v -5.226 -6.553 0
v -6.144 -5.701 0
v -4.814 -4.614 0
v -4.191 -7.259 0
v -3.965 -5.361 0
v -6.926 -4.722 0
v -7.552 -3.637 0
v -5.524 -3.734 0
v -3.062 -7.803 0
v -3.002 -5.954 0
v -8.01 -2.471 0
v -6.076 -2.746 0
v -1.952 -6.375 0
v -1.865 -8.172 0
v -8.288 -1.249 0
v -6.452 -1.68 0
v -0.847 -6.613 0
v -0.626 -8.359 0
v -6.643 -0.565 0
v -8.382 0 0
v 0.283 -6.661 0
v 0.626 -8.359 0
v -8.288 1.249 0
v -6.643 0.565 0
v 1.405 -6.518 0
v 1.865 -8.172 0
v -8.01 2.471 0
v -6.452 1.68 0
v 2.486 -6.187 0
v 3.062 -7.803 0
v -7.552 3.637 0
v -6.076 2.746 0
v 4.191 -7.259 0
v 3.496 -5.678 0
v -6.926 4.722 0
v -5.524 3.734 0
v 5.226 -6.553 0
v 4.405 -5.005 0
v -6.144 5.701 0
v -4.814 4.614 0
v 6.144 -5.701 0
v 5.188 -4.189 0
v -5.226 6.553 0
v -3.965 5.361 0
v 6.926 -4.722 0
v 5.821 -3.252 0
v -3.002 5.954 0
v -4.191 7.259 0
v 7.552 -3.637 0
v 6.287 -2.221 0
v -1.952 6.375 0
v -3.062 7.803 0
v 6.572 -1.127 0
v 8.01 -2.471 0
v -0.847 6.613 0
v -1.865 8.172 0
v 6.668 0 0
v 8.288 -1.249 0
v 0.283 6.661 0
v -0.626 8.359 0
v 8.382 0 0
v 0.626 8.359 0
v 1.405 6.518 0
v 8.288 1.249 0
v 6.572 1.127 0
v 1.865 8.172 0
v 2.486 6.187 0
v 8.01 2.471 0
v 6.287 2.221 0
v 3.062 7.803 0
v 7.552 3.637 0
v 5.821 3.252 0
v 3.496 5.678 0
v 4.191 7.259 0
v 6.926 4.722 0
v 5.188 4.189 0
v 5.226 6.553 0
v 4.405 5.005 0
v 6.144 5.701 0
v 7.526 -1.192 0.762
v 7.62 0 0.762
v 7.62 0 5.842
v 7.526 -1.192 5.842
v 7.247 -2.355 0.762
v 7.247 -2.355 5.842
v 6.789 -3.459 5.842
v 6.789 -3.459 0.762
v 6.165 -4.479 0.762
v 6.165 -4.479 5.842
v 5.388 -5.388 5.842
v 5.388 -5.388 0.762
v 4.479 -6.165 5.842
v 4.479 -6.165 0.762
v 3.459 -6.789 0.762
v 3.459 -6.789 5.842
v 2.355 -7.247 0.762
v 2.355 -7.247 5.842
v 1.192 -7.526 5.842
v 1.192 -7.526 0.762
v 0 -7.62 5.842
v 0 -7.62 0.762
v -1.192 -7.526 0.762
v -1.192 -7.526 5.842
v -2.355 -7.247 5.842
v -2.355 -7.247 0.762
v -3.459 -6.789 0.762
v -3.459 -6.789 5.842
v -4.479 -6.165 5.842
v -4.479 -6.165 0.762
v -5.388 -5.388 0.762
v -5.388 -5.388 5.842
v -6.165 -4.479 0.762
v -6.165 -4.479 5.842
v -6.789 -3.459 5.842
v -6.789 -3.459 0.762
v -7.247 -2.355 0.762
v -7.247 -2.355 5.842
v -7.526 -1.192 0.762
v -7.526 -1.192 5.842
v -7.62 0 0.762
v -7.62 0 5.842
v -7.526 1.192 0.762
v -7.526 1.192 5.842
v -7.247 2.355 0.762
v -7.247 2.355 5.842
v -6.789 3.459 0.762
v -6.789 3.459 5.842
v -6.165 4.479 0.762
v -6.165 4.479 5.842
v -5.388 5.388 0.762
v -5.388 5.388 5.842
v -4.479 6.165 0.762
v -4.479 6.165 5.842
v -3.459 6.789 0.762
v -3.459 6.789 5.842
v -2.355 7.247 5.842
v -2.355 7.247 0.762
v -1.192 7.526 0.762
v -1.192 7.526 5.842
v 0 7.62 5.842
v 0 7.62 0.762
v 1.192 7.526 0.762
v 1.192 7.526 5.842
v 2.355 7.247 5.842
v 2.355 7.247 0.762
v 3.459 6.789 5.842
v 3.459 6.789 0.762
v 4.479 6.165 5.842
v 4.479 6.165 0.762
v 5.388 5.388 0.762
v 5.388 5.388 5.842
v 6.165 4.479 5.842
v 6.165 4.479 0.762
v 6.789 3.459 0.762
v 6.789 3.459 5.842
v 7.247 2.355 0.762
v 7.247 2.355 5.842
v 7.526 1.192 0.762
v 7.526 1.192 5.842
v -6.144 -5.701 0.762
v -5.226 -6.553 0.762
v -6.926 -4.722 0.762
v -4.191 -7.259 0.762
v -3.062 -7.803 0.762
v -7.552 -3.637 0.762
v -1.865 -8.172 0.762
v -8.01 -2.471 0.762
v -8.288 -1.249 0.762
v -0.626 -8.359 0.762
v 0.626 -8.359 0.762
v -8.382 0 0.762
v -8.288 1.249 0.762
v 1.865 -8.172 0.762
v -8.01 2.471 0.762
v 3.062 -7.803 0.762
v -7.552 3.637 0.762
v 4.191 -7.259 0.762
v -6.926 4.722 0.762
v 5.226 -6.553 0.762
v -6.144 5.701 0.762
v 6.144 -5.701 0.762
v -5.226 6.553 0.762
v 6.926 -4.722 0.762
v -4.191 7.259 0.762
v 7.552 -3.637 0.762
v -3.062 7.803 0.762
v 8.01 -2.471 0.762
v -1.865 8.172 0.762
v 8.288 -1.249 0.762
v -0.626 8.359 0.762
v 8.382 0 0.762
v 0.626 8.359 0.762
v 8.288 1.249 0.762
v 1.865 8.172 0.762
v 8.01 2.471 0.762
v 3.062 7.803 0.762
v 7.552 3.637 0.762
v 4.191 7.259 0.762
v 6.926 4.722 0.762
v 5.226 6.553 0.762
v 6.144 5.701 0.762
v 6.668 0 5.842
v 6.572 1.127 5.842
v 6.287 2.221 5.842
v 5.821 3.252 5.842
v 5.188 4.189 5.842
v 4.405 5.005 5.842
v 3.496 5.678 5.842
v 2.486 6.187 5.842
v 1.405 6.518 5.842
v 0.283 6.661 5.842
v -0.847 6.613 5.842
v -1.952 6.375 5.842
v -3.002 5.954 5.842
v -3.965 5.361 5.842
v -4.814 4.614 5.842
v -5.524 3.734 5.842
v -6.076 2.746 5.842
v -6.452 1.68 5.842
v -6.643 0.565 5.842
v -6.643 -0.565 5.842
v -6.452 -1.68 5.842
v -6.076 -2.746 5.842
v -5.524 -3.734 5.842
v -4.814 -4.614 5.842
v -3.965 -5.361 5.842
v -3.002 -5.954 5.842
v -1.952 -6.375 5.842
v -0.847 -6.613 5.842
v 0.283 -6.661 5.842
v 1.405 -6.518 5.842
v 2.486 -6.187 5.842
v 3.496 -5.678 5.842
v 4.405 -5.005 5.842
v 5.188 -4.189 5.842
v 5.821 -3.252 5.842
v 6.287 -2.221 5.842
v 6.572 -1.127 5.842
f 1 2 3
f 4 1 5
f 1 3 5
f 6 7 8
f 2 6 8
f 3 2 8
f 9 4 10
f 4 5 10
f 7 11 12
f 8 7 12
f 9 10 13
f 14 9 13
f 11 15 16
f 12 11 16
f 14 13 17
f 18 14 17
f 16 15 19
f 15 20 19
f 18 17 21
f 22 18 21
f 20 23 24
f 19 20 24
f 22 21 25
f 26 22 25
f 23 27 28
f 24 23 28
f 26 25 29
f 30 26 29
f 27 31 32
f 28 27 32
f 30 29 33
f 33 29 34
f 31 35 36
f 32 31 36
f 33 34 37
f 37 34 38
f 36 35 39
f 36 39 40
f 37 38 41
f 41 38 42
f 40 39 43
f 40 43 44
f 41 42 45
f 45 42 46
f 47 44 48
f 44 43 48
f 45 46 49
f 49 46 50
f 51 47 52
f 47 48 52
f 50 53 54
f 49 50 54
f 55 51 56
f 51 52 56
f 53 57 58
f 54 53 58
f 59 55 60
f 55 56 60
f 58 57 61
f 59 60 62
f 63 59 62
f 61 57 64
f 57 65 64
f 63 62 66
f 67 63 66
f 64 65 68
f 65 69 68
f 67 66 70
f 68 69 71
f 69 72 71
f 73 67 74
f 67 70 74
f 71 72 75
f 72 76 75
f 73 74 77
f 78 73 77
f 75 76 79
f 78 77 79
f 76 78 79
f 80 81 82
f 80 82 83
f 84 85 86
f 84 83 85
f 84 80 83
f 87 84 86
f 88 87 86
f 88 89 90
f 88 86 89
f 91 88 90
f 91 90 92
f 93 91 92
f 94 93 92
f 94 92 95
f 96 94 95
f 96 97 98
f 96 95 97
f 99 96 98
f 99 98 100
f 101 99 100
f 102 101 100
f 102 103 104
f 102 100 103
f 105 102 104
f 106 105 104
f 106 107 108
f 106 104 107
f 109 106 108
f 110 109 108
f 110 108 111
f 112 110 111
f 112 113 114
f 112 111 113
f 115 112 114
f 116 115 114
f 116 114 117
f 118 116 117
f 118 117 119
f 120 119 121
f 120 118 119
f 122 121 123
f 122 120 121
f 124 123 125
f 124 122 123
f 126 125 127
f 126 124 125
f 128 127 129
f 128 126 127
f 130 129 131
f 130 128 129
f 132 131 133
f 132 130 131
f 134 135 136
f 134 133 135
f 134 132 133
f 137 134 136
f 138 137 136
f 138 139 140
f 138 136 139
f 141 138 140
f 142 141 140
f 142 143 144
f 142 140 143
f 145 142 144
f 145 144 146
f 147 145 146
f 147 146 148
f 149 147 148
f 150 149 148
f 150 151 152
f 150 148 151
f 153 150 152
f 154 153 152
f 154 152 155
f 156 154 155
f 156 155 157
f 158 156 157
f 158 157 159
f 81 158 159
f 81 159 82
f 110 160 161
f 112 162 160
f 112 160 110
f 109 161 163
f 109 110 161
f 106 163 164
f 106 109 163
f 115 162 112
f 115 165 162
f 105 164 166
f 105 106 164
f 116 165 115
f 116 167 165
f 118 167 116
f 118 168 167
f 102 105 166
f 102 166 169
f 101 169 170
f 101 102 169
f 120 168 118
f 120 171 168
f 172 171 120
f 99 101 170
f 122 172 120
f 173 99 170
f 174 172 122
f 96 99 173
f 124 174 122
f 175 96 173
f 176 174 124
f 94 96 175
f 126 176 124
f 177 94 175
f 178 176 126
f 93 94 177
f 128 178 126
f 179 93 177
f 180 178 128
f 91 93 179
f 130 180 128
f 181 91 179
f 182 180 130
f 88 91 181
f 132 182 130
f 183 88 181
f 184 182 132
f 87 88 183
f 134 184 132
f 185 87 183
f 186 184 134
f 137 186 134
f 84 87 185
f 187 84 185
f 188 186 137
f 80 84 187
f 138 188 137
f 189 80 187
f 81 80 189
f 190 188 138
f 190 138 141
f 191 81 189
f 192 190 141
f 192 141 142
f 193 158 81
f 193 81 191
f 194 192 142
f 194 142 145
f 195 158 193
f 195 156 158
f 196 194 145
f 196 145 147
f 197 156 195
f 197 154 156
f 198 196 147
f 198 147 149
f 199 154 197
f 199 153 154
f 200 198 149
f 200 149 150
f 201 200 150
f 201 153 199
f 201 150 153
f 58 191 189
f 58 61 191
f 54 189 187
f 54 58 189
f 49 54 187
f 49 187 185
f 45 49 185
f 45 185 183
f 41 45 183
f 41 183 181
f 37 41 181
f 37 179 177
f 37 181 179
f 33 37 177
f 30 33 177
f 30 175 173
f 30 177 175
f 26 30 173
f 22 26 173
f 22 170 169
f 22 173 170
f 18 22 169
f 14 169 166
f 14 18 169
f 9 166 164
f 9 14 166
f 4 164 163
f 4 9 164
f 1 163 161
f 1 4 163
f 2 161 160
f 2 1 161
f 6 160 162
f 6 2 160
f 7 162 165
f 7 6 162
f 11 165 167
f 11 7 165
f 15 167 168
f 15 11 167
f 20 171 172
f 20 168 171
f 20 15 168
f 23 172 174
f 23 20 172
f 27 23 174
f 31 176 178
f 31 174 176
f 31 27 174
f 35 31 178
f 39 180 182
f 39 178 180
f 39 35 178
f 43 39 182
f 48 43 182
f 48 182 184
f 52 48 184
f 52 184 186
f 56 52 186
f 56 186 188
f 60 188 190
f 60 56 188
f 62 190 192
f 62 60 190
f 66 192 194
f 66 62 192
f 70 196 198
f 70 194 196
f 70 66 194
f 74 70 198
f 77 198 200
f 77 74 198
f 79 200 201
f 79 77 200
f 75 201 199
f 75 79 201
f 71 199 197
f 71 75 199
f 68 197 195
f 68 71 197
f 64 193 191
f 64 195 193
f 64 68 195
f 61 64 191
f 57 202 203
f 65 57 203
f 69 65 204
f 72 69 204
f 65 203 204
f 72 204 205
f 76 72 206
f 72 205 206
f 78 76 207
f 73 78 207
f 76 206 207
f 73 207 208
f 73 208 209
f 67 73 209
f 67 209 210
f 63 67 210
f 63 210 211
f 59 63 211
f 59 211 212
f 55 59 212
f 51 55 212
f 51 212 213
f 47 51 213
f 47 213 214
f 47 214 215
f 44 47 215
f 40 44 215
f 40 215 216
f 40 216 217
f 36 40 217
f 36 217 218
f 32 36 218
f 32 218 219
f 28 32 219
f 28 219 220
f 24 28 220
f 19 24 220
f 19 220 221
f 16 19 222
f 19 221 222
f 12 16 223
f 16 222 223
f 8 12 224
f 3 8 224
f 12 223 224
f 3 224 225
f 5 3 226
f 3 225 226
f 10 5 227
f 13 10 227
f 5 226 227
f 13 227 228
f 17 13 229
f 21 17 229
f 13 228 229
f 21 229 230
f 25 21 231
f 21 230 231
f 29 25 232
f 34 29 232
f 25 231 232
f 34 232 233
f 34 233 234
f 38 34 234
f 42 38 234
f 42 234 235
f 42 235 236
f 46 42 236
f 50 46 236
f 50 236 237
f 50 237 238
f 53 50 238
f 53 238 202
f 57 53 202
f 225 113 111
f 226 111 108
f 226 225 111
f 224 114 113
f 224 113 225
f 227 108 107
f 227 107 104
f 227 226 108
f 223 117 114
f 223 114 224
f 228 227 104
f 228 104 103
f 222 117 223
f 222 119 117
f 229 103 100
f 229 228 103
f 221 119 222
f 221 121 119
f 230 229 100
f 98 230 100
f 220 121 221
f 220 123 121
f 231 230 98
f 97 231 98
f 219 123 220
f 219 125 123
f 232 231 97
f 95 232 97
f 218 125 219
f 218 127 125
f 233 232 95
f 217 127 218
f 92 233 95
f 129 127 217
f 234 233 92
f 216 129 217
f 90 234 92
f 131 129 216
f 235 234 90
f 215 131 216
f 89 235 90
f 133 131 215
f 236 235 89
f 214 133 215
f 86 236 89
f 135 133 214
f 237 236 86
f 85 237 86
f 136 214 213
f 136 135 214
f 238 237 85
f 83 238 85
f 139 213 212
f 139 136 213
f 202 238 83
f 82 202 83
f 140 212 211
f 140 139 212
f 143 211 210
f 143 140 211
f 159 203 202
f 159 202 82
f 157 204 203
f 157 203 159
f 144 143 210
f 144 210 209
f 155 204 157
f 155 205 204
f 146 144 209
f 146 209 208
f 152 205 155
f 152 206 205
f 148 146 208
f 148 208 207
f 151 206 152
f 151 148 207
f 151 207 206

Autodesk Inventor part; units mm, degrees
ref_plane "YZ Plane" through (0, 0, 0) normal (1, 0, 0) x (0, 1, 0)
ref_plane "XZ Plane" through (0, 0, 0) normal (0, 1, 0) x (-1, 0, 0)
ref_plane "XY Plane" through (0, 0, 0) normal (0, 0, 1) x (1, 0, 0)
sketch "Sketch1" plane through (0, 0, 0) normal (0, 0, 1) x (1, 0, 0)
  circle A0 centre (0, 0) radius 8.382
  dimension "d0" = 16.764
extrude "Extrusion1" add sketch "Sketch1" along normal blind 0.762
sketch "Sketch3" plane through (0, 0, 0.762) normal (0, 0, 1) x (1, 0, 0)
  circle A0 centre (0, 0) radius 8.382 projected
  circle A1 centre (0, 0) radius 7.62
  dimension "d13" = 15.24
extrude "Extrusion2" add sketch "Sketch3" along normal blind 5.08 contours A1
sketch "Sketch4" plane through (0, 0, 5.842) normal (0, 0, 1) x (1, 0, 0)
  circle A0 centre (0, 0) radius 7.62 projected
  circle A1 centre (0, 0) radius 6.6675
  dimension "d16" = 13.335
extrude "Extrusion3" cut sketch "Sketch4" against normal through all contours A1
thread "Thread2" size "4-40 UNC" class "2B" standard "ANSI Unified Screw Threads" full length
properties part number "base_a"
